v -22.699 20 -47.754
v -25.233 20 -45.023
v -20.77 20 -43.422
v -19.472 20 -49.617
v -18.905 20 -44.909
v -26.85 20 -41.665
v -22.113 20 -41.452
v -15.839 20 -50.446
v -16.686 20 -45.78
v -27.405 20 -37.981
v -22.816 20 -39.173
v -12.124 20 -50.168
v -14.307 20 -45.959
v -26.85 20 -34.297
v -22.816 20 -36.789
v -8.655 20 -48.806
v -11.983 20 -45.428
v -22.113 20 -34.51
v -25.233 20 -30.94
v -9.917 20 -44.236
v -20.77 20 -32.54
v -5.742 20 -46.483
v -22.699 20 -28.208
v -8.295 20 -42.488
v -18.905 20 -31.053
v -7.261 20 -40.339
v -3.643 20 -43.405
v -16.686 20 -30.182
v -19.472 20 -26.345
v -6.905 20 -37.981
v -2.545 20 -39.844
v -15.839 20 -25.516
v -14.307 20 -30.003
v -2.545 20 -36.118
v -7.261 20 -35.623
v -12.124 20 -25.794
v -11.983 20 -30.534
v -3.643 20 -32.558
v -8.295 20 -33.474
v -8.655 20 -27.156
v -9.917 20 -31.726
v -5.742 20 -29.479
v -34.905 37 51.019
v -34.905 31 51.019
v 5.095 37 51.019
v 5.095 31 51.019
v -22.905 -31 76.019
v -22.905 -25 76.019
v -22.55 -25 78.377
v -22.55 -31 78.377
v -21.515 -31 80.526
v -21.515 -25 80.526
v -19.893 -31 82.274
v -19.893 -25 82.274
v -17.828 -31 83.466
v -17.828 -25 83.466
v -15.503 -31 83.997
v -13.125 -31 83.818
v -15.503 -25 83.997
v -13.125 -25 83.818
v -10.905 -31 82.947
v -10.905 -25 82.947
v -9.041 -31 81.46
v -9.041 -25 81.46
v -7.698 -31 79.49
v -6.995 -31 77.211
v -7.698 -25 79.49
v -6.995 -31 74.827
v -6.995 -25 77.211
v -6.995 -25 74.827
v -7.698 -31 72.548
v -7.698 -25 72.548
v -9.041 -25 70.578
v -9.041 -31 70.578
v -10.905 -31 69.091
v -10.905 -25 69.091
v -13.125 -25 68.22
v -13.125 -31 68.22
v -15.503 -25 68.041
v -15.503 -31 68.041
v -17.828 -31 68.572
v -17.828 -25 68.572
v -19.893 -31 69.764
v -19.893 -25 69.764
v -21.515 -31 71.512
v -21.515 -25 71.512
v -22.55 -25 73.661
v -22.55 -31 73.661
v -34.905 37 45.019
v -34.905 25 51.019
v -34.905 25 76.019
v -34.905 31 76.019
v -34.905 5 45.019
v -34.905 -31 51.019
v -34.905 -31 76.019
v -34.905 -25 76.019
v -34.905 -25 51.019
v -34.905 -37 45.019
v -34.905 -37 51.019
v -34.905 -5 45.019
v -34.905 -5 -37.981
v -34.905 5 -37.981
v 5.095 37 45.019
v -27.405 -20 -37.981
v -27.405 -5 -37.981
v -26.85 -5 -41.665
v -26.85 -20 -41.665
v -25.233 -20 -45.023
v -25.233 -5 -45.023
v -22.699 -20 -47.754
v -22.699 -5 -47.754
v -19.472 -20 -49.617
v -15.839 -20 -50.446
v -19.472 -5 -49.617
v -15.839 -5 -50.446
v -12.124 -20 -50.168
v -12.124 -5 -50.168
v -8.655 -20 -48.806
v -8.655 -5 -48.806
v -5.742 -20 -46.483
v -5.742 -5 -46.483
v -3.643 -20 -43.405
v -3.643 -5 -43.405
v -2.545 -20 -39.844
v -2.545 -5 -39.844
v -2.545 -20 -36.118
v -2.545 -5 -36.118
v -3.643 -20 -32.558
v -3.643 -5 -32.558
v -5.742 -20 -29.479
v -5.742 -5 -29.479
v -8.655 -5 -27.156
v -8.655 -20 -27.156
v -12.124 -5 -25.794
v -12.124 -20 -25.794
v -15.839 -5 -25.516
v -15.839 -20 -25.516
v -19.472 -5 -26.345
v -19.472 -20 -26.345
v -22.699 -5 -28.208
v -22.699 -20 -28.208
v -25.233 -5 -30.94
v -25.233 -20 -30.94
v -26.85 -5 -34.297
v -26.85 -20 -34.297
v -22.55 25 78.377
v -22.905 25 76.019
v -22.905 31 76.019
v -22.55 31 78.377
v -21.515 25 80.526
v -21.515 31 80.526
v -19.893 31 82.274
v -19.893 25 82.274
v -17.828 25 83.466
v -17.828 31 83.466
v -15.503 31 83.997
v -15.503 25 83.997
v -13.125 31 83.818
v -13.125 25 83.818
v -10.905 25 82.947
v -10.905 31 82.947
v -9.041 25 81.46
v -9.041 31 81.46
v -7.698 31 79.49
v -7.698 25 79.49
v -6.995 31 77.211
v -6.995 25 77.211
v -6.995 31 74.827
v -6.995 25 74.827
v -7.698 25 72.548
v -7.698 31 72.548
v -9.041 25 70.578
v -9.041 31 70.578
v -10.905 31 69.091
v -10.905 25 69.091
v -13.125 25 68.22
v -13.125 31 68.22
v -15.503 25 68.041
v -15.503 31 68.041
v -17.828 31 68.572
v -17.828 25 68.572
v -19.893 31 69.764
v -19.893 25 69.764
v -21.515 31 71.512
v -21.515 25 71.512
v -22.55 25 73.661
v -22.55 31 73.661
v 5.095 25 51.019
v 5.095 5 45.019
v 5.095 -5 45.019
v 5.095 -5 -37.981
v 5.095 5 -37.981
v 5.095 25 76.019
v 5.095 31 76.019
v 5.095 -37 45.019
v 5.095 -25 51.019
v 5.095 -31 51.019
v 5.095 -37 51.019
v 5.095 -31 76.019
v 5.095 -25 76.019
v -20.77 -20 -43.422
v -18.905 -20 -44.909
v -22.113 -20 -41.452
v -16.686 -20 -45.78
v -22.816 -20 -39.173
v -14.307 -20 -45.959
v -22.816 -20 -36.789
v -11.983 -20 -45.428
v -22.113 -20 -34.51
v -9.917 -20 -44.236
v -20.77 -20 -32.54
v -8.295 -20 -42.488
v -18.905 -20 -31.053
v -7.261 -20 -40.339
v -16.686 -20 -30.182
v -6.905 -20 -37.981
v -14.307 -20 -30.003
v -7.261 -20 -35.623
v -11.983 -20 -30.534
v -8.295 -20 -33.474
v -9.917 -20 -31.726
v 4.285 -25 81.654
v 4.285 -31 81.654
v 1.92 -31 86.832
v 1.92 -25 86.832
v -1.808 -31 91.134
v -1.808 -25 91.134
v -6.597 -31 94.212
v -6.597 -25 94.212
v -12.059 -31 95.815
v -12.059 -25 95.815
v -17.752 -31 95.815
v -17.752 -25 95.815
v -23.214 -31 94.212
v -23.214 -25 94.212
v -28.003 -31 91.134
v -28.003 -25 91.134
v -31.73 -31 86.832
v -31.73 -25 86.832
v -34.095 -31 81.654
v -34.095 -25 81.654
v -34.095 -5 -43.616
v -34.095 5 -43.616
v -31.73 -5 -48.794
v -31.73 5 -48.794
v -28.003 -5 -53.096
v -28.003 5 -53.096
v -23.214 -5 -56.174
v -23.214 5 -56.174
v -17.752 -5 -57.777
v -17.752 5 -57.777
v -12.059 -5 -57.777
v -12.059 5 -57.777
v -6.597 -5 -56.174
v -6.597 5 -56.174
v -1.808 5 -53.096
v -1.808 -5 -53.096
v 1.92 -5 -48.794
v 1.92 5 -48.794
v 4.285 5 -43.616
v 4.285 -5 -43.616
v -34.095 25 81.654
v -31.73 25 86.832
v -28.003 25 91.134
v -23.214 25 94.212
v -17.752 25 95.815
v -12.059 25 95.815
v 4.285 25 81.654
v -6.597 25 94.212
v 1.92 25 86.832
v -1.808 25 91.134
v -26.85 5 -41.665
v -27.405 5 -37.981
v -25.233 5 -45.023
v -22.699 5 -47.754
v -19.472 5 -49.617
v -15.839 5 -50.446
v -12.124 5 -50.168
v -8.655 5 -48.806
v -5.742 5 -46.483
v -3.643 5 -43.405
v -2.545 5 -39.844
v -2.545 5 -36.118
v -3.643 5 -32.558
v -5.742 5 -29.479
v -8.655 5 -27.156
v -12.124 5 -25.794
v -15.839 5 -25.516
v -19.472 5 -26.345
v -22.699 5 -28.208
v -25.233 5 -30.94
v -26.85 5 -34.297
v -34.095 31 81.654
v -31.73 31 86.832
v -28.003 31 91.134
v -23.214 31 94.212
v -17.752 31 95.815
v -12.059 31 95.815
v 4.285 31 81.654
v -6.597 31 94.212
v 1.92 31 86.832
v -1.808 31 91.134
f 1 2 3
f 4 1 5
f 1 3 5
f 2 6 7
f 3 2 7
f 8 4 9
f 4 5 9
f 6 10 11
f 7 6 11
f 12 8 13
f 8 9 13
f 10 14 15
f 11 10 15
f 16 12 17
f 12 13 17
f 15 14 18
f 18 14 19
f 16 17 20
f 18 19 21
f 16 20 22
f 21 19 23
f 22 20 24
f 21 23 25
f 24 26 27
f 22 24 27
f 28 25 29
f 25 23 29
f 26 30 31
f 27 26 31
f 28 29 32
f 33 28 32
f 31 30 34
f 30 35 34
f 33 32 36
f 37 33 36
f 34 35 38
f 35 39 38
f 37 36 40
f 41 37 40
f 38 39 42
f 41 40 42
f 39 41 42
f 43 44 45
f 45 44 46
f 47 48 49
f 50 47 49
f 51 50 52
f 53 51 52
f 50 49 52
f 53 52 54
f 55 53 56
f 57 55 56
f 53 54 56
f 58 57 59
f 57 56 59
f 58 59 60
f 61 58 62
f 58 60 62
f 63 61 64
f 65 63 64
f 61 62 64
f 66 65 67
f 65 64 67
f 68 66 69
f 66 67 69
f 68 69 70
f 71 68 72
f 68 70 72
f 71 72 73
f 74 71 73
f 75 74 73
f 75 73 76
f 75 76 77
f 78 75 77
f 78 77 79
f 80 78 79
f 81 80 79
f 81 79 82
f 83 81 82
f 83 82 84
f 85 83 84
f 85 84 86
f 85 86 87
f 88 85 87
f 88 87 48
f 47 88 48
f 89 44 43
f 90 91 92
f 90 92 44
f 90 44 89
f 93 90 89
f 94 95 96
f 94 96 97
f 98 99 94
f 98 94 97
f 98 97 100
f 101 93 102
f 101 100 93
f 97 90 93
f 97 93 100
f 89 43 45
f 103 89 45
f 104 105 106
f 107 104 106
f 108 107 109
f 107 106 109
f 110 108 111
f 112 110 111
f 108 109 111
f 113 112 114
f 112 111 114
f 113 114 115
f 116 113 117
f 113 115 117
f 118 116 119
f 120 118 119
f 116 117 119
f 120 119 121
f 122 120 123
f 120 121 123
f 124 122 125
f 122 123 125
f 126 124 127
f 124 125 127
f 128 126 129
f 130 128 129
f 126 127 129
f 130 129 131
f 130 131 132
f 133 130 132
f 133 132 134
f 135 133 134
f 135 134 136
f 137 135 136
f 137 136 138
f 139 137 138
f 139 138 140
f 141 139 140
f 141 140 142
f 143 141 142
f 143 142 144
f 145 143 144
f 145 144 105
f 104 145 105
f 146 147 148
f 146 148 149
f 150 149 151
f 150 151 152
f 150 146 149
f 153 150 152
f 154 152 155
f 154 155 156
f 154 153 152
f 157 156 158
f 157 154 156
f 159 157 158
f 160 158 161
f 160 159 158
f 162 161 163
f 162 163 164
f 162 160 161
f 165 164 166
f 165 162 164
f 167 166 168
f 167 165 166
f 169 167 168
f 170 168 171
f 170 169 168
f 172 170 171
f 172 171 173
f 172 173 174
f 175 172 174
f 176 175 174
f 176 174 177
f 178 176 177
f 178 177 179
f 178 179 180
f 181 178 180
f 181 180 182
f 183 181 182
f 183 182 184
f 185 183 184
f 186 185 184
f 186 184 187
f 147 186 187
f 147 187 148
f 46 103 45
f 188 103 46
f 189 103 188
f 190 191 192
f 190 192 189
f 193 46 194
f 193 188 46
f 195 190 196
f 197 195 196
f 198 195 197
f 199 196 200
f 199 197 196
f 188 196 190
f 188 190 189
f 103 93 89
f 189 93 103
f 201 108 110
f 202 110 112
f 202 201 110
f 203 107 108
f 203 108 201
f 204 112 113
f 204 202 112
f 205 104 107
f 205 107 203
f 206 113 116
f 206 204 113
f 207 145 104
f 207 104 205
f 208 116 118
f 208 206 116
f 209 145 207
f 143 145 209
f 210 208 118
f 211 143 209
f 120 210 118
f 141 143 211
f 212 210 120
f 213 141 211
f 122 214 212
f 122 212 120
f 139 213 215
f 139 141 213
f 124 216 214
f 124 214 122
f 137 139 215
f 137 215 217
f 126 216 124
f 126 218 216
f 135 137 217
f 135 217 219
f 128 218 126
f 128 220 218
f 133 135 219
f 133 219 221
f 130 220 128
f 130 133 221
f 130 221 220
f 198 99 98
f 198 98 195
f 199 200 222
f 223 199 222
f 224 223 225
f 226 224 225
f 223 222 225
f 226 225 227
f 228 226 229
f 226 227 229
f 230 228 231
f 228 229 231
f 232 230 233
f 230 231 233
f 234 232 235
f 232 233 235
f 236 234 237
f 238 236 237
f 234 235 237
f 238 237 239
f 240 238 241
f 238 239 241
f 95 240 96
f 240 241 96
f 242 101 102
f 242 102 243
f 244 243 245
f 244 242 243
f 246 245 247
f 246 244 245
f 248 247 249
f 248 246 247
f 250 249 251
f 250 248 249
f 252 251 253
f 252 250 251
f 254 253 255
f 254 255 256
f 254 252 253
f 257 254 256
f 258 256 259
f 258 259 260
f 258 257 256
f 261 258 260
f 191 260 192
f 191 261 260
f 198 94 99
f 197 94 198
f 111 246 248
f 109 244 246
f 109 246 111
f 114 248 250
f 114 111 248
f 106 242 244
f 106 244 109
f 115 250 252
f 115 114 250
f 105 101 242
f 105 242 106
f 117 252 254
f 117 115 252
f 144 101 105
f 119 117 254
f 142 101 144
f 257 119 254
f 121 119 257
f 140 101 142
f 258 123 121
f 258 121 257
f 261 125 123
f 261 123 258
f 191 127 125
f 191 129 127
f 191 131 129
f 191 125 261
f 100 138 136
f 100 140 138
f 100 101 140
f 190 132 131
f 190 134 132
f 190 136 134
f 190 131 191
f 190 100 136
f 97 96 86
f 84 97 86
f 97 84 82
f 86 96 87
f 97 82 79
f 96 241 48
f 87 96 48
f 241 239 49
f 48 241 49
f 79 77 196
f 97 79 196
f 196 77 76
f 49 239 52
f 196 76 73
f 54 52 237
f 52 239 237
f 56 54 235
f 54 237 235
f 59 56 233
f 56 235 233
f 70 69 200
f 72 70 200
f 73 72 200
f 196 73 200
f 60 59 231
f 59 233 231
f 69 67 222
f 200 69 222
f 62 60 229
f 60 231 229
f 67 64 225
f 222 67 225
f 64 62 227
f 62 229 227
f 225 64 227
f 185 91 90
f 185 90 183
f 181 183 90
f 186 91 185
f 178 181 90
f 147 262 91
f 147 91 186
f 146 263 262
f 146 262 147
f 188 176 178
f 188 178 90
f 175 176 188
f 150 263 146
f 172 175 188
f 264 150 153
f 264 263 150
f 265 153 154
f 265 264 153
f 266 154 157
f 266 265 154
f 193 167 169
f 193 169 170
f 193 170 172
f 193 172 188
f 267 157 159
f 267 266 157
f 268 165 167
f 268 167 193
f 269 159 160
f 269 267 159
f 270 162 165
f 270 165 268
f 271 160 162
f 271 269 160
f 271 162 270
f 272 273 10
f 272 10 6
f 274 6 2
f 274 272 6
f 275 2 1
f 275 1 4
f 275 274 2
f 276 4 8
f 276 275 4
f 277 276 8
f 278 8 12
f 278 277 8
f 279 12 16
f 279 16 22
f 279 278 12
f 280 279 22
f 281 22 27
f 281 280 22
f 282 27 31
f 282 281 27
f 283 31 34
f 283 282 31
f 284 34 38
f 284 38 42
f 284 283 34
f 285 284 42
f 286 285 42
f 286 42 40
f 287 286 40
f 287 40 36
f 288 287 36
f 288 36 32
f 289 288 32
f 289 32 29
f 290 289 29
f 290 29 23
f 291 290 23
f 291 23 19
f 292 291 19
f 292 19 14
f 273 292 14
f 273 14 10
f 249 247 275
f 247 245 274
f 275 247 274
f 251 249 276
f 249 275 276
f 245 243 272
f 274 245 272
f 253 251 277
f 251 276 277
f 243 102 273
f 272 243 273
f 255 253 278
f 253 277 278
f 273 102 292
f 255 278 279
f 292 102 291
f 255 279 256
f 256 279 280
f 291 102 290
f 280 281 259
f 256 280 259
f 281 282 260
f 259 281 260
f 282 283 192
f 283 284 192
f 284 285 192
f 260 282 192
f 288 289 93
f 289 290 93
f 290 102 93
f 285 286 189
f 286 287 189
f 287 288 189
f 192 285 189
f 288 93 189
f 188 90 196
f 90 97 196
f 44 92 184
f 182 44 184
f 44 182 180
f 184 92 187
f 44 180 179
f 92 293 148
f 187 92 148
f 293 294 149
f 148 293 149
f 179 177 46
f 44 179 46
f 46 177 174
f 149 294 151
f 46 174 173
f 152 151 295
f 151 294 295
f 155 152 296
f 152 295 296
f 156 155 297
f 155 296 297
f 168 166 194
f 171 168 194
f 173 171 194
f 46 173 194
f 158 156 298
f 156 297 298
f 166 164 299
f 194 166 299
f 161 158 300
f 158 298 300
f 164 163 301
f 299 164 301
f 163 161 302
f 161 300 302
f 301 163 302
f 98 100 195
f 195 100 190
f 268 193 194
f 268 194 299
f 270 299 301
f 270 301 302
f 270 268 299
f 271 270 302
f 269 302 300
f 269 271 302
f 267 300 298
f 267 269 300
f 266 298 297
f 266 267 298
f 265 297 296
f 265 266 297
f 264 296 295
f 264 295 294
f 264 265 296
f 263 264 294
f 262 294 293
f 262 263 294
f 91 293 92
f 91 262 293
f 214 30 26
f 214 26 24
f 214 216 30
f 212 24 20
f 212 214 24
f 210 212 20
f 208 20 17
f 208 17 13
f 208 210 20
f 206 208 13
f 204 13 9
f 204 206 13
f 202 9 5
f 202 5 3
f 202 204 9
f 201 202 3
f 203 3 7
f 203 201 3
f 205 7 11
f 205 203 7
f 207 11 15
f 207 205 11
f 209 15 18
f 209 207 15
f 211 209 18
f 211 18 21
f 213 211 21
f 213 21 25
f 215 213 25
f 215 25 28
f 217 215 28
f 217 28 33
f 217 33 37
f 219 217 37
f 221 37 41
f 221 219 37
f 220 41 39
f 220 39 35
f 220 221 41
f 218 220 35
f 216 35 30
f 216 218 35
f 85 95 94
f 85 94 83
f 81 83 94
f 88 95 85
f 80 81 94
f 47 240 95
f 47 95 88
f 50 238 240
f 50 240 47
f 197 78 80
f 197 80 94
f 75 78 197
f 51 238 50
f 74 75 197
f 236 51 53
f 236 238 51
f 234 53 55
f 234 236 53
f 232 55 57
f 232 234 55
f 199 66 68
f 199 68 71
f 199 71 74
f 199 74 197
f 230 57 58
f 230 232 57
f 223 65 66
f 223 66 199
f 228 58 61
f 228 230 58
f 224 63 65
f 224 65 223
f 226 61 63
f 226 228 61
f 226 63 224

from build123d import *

# Parameters (mm, degrees)
F0_W     = 40
F0_H     = 6
F1_DEPTH = 37
F2_DEPTH = 5
F3_DEPTH = 31
F4_DEPTH = 25
F5_DEPTH = 20


with BuildPart() as f1:
    # F0 (on Front) → F1 (new body)
    with BuildSketch(Plane.XZ):
        with Locations((-14.9053405225, 48.0189405978)):
            Rectangle(F0_W, F0_H)
    extrude(amount=F1_DEPTH)

    # F0 (on Front) → F2 (join)
    with BuildSketch(Plane.XZ):
        with BuildLine():
            Line((5.0946594775, -37.9810594022), (5.0946594775, 45.0189405978))
            Line((5.0946594775, 45.0189405978), (-34.9053405225, 45.0189405978))
            Line((-34.9053405225, 45.0189405978), (-34.9053405225, -37.9810594022))
            Line((-34.9053405225, -37.9810594022), (-27.4053405225, -37.9810594022))
            ThreePointArc((-27.4053405225, -37.9810594022), (-14.9053405225, -25.4810594022), (-2.4053405225, -37.9810594022))
            Line((-2.4053405225, -37.9810594022), (5.0946594775, -37.9810594022))
        make_face()
        with BuildLine():
            ThreePointArc((-34.9053405225, -37.9810594022), (-14.9053405225, -57.9810594022), (5.0946594775, -37.9810594022))
            Line((5.0946594775, -37.9810594022), (-2.4053405225, -37.9810594022))
            ThreePointArc((-2.4053405225, -37.9810594022), (-14.9053405225, -50.4810594022), (-27.4053405225, -37.9810594022))
            Line((-27.4053405225, -37.9810594022), (-34.9053405225, -37.9810594022))
        make_face()
    extrude(amount=F2_DEPTH)

    # F0 (on Front) → F3 (join)
    with BuildSketch(Plane.XZ):
        with BuildLine():
            Line((5.0946594775, 76.0189405978), (-6.9053405225, 76.0189405978))
            ThreePointArc((-6.9053405225, 76.0189405978), (-14.9053405225, 68.0189405978), (-22.9053405225, 76.0189405978))
            Line((-22.9053405225, 76.0189405978), (-34.9053405225, 76.0189405978))
            Line((-34.9053405225, 76.0189405978), (-34.9053405225, 51.0189405978))
            Line((-34.9053405225, 51.0189405978), (5.0946594775, 51.0189405978))
            Line((5.0946594775, 51.0189405978), (5.0946594775, 76.0189405978))
        make_face()
        with BuildLine():
            ThreePointArc((-22.9053405225, 76.0189405978), (-14.9053405225, 84.0189405978), (-6.9053405225, 76.0189405978))
            Line((-6.9053405225, 76.0189405978), (5.0946594775, 76.0189405978))
            ThreePointArc((5.0946594775, 76.0189405978), (-14.9053405225, 96.0189405978), (-34.9053405225, 76.0189405978))
            Line((-34.9053405225, 76.0189405978), (-22.9053405225, 76.0189405978))
        make_face()
    extrude(amount=F3_DEPTH)

    # F0 (on Front) → F4 (cut)
    with BuildSketch(Plane.XZ):
        with BuildLine():
            Line((5.0946594775, 76.0189405978), (-6.9053405225, 76.0189405978))
            ThreePointArc((-6.9053405225, 76.0189405978), (-14.9053405225, 68.0189405978), (-22.9053405225, 76.0189405978))
            Line((-22.9053405225, 76.0189405978), (-34.9053405225, 76.0189405978))
            Line((-34.9053405225, 76.0189405978), (-34.9053405225, 51.0189405978))
            Line((-34.9053405225, 51.0189405978), (5.0946594775, 51.0189405978))
            Line((5.0946594775, 51.0189405978), (5.0946594775, 76.0189405978))
        make_face()
        with BuildLine():
            ThreePointArc((-22.9053405225, 76.0189405978), (-14.9053405225, 84.0189405978), (-6.9053405225, 76.0189405978))
            Line((-6.9053405225, 76.0189405978), (5.0946594775, 76.0189405978))
            ThreePointArc((5.0946594775, 76.0189405978), (-14.9053405225, 96.0189405978), (-34.9053405225, 76.0189405978))
            Line((-34.9053405225, 76.0189405978), (-22.9053405225, 76.0189405978))
        make_face()
    extrude(amount=F4_DEPTH, mode=Mode.SUBTRACT)

    # F0 (on Front) → F5 (join)
    with BuildSketch(Plane.XZ):
        with BuildLine():
            Line((-6.9053405225, -37.9810594022), (-2.4053405225, -37.9810594022))
            ThreePointArc((-2.4053405225, -37.9810594022), (-14.9053405225, -25.4810594022), (-27.4053405225, -37.9810594022))
            Line((-27.4053405225, -37.9810594022), (-22.9053405225, -37.9810594022))
            ThreePointArc((-22.9053405225, -37.9810594022), (-14.9053405225, -29.9810594022), (-6.9053405225, -37.9810594022))
        make_face()
        with BuildLine():
            ThreePointArc((-27.4053405225, -37.9810594022), (-14.9053405225, -50.4810594022), (-2.4053405225, -37.9810594022))
            Line((-2.4053405225, -37.9810594022), (-6.9053405225, -37.9810594022))
            ThreePointArc((-6.9053405225, -37.9810594022), (-14.9053405225, -45.9810594022), (-22.9053405225, -37.9810594022))
            Line((-22.9053405225, -37.9810594022), (-27.4053405225, -37.9810594022))
        make_face()
    extrude(amount=F5_DEPTH)

    # F6: F1 across plane


with BuildPart() as f1_1:
    add(f1.part)
    add(f1.part.mirror(Plane.XZ))


solid = f1_1.part
